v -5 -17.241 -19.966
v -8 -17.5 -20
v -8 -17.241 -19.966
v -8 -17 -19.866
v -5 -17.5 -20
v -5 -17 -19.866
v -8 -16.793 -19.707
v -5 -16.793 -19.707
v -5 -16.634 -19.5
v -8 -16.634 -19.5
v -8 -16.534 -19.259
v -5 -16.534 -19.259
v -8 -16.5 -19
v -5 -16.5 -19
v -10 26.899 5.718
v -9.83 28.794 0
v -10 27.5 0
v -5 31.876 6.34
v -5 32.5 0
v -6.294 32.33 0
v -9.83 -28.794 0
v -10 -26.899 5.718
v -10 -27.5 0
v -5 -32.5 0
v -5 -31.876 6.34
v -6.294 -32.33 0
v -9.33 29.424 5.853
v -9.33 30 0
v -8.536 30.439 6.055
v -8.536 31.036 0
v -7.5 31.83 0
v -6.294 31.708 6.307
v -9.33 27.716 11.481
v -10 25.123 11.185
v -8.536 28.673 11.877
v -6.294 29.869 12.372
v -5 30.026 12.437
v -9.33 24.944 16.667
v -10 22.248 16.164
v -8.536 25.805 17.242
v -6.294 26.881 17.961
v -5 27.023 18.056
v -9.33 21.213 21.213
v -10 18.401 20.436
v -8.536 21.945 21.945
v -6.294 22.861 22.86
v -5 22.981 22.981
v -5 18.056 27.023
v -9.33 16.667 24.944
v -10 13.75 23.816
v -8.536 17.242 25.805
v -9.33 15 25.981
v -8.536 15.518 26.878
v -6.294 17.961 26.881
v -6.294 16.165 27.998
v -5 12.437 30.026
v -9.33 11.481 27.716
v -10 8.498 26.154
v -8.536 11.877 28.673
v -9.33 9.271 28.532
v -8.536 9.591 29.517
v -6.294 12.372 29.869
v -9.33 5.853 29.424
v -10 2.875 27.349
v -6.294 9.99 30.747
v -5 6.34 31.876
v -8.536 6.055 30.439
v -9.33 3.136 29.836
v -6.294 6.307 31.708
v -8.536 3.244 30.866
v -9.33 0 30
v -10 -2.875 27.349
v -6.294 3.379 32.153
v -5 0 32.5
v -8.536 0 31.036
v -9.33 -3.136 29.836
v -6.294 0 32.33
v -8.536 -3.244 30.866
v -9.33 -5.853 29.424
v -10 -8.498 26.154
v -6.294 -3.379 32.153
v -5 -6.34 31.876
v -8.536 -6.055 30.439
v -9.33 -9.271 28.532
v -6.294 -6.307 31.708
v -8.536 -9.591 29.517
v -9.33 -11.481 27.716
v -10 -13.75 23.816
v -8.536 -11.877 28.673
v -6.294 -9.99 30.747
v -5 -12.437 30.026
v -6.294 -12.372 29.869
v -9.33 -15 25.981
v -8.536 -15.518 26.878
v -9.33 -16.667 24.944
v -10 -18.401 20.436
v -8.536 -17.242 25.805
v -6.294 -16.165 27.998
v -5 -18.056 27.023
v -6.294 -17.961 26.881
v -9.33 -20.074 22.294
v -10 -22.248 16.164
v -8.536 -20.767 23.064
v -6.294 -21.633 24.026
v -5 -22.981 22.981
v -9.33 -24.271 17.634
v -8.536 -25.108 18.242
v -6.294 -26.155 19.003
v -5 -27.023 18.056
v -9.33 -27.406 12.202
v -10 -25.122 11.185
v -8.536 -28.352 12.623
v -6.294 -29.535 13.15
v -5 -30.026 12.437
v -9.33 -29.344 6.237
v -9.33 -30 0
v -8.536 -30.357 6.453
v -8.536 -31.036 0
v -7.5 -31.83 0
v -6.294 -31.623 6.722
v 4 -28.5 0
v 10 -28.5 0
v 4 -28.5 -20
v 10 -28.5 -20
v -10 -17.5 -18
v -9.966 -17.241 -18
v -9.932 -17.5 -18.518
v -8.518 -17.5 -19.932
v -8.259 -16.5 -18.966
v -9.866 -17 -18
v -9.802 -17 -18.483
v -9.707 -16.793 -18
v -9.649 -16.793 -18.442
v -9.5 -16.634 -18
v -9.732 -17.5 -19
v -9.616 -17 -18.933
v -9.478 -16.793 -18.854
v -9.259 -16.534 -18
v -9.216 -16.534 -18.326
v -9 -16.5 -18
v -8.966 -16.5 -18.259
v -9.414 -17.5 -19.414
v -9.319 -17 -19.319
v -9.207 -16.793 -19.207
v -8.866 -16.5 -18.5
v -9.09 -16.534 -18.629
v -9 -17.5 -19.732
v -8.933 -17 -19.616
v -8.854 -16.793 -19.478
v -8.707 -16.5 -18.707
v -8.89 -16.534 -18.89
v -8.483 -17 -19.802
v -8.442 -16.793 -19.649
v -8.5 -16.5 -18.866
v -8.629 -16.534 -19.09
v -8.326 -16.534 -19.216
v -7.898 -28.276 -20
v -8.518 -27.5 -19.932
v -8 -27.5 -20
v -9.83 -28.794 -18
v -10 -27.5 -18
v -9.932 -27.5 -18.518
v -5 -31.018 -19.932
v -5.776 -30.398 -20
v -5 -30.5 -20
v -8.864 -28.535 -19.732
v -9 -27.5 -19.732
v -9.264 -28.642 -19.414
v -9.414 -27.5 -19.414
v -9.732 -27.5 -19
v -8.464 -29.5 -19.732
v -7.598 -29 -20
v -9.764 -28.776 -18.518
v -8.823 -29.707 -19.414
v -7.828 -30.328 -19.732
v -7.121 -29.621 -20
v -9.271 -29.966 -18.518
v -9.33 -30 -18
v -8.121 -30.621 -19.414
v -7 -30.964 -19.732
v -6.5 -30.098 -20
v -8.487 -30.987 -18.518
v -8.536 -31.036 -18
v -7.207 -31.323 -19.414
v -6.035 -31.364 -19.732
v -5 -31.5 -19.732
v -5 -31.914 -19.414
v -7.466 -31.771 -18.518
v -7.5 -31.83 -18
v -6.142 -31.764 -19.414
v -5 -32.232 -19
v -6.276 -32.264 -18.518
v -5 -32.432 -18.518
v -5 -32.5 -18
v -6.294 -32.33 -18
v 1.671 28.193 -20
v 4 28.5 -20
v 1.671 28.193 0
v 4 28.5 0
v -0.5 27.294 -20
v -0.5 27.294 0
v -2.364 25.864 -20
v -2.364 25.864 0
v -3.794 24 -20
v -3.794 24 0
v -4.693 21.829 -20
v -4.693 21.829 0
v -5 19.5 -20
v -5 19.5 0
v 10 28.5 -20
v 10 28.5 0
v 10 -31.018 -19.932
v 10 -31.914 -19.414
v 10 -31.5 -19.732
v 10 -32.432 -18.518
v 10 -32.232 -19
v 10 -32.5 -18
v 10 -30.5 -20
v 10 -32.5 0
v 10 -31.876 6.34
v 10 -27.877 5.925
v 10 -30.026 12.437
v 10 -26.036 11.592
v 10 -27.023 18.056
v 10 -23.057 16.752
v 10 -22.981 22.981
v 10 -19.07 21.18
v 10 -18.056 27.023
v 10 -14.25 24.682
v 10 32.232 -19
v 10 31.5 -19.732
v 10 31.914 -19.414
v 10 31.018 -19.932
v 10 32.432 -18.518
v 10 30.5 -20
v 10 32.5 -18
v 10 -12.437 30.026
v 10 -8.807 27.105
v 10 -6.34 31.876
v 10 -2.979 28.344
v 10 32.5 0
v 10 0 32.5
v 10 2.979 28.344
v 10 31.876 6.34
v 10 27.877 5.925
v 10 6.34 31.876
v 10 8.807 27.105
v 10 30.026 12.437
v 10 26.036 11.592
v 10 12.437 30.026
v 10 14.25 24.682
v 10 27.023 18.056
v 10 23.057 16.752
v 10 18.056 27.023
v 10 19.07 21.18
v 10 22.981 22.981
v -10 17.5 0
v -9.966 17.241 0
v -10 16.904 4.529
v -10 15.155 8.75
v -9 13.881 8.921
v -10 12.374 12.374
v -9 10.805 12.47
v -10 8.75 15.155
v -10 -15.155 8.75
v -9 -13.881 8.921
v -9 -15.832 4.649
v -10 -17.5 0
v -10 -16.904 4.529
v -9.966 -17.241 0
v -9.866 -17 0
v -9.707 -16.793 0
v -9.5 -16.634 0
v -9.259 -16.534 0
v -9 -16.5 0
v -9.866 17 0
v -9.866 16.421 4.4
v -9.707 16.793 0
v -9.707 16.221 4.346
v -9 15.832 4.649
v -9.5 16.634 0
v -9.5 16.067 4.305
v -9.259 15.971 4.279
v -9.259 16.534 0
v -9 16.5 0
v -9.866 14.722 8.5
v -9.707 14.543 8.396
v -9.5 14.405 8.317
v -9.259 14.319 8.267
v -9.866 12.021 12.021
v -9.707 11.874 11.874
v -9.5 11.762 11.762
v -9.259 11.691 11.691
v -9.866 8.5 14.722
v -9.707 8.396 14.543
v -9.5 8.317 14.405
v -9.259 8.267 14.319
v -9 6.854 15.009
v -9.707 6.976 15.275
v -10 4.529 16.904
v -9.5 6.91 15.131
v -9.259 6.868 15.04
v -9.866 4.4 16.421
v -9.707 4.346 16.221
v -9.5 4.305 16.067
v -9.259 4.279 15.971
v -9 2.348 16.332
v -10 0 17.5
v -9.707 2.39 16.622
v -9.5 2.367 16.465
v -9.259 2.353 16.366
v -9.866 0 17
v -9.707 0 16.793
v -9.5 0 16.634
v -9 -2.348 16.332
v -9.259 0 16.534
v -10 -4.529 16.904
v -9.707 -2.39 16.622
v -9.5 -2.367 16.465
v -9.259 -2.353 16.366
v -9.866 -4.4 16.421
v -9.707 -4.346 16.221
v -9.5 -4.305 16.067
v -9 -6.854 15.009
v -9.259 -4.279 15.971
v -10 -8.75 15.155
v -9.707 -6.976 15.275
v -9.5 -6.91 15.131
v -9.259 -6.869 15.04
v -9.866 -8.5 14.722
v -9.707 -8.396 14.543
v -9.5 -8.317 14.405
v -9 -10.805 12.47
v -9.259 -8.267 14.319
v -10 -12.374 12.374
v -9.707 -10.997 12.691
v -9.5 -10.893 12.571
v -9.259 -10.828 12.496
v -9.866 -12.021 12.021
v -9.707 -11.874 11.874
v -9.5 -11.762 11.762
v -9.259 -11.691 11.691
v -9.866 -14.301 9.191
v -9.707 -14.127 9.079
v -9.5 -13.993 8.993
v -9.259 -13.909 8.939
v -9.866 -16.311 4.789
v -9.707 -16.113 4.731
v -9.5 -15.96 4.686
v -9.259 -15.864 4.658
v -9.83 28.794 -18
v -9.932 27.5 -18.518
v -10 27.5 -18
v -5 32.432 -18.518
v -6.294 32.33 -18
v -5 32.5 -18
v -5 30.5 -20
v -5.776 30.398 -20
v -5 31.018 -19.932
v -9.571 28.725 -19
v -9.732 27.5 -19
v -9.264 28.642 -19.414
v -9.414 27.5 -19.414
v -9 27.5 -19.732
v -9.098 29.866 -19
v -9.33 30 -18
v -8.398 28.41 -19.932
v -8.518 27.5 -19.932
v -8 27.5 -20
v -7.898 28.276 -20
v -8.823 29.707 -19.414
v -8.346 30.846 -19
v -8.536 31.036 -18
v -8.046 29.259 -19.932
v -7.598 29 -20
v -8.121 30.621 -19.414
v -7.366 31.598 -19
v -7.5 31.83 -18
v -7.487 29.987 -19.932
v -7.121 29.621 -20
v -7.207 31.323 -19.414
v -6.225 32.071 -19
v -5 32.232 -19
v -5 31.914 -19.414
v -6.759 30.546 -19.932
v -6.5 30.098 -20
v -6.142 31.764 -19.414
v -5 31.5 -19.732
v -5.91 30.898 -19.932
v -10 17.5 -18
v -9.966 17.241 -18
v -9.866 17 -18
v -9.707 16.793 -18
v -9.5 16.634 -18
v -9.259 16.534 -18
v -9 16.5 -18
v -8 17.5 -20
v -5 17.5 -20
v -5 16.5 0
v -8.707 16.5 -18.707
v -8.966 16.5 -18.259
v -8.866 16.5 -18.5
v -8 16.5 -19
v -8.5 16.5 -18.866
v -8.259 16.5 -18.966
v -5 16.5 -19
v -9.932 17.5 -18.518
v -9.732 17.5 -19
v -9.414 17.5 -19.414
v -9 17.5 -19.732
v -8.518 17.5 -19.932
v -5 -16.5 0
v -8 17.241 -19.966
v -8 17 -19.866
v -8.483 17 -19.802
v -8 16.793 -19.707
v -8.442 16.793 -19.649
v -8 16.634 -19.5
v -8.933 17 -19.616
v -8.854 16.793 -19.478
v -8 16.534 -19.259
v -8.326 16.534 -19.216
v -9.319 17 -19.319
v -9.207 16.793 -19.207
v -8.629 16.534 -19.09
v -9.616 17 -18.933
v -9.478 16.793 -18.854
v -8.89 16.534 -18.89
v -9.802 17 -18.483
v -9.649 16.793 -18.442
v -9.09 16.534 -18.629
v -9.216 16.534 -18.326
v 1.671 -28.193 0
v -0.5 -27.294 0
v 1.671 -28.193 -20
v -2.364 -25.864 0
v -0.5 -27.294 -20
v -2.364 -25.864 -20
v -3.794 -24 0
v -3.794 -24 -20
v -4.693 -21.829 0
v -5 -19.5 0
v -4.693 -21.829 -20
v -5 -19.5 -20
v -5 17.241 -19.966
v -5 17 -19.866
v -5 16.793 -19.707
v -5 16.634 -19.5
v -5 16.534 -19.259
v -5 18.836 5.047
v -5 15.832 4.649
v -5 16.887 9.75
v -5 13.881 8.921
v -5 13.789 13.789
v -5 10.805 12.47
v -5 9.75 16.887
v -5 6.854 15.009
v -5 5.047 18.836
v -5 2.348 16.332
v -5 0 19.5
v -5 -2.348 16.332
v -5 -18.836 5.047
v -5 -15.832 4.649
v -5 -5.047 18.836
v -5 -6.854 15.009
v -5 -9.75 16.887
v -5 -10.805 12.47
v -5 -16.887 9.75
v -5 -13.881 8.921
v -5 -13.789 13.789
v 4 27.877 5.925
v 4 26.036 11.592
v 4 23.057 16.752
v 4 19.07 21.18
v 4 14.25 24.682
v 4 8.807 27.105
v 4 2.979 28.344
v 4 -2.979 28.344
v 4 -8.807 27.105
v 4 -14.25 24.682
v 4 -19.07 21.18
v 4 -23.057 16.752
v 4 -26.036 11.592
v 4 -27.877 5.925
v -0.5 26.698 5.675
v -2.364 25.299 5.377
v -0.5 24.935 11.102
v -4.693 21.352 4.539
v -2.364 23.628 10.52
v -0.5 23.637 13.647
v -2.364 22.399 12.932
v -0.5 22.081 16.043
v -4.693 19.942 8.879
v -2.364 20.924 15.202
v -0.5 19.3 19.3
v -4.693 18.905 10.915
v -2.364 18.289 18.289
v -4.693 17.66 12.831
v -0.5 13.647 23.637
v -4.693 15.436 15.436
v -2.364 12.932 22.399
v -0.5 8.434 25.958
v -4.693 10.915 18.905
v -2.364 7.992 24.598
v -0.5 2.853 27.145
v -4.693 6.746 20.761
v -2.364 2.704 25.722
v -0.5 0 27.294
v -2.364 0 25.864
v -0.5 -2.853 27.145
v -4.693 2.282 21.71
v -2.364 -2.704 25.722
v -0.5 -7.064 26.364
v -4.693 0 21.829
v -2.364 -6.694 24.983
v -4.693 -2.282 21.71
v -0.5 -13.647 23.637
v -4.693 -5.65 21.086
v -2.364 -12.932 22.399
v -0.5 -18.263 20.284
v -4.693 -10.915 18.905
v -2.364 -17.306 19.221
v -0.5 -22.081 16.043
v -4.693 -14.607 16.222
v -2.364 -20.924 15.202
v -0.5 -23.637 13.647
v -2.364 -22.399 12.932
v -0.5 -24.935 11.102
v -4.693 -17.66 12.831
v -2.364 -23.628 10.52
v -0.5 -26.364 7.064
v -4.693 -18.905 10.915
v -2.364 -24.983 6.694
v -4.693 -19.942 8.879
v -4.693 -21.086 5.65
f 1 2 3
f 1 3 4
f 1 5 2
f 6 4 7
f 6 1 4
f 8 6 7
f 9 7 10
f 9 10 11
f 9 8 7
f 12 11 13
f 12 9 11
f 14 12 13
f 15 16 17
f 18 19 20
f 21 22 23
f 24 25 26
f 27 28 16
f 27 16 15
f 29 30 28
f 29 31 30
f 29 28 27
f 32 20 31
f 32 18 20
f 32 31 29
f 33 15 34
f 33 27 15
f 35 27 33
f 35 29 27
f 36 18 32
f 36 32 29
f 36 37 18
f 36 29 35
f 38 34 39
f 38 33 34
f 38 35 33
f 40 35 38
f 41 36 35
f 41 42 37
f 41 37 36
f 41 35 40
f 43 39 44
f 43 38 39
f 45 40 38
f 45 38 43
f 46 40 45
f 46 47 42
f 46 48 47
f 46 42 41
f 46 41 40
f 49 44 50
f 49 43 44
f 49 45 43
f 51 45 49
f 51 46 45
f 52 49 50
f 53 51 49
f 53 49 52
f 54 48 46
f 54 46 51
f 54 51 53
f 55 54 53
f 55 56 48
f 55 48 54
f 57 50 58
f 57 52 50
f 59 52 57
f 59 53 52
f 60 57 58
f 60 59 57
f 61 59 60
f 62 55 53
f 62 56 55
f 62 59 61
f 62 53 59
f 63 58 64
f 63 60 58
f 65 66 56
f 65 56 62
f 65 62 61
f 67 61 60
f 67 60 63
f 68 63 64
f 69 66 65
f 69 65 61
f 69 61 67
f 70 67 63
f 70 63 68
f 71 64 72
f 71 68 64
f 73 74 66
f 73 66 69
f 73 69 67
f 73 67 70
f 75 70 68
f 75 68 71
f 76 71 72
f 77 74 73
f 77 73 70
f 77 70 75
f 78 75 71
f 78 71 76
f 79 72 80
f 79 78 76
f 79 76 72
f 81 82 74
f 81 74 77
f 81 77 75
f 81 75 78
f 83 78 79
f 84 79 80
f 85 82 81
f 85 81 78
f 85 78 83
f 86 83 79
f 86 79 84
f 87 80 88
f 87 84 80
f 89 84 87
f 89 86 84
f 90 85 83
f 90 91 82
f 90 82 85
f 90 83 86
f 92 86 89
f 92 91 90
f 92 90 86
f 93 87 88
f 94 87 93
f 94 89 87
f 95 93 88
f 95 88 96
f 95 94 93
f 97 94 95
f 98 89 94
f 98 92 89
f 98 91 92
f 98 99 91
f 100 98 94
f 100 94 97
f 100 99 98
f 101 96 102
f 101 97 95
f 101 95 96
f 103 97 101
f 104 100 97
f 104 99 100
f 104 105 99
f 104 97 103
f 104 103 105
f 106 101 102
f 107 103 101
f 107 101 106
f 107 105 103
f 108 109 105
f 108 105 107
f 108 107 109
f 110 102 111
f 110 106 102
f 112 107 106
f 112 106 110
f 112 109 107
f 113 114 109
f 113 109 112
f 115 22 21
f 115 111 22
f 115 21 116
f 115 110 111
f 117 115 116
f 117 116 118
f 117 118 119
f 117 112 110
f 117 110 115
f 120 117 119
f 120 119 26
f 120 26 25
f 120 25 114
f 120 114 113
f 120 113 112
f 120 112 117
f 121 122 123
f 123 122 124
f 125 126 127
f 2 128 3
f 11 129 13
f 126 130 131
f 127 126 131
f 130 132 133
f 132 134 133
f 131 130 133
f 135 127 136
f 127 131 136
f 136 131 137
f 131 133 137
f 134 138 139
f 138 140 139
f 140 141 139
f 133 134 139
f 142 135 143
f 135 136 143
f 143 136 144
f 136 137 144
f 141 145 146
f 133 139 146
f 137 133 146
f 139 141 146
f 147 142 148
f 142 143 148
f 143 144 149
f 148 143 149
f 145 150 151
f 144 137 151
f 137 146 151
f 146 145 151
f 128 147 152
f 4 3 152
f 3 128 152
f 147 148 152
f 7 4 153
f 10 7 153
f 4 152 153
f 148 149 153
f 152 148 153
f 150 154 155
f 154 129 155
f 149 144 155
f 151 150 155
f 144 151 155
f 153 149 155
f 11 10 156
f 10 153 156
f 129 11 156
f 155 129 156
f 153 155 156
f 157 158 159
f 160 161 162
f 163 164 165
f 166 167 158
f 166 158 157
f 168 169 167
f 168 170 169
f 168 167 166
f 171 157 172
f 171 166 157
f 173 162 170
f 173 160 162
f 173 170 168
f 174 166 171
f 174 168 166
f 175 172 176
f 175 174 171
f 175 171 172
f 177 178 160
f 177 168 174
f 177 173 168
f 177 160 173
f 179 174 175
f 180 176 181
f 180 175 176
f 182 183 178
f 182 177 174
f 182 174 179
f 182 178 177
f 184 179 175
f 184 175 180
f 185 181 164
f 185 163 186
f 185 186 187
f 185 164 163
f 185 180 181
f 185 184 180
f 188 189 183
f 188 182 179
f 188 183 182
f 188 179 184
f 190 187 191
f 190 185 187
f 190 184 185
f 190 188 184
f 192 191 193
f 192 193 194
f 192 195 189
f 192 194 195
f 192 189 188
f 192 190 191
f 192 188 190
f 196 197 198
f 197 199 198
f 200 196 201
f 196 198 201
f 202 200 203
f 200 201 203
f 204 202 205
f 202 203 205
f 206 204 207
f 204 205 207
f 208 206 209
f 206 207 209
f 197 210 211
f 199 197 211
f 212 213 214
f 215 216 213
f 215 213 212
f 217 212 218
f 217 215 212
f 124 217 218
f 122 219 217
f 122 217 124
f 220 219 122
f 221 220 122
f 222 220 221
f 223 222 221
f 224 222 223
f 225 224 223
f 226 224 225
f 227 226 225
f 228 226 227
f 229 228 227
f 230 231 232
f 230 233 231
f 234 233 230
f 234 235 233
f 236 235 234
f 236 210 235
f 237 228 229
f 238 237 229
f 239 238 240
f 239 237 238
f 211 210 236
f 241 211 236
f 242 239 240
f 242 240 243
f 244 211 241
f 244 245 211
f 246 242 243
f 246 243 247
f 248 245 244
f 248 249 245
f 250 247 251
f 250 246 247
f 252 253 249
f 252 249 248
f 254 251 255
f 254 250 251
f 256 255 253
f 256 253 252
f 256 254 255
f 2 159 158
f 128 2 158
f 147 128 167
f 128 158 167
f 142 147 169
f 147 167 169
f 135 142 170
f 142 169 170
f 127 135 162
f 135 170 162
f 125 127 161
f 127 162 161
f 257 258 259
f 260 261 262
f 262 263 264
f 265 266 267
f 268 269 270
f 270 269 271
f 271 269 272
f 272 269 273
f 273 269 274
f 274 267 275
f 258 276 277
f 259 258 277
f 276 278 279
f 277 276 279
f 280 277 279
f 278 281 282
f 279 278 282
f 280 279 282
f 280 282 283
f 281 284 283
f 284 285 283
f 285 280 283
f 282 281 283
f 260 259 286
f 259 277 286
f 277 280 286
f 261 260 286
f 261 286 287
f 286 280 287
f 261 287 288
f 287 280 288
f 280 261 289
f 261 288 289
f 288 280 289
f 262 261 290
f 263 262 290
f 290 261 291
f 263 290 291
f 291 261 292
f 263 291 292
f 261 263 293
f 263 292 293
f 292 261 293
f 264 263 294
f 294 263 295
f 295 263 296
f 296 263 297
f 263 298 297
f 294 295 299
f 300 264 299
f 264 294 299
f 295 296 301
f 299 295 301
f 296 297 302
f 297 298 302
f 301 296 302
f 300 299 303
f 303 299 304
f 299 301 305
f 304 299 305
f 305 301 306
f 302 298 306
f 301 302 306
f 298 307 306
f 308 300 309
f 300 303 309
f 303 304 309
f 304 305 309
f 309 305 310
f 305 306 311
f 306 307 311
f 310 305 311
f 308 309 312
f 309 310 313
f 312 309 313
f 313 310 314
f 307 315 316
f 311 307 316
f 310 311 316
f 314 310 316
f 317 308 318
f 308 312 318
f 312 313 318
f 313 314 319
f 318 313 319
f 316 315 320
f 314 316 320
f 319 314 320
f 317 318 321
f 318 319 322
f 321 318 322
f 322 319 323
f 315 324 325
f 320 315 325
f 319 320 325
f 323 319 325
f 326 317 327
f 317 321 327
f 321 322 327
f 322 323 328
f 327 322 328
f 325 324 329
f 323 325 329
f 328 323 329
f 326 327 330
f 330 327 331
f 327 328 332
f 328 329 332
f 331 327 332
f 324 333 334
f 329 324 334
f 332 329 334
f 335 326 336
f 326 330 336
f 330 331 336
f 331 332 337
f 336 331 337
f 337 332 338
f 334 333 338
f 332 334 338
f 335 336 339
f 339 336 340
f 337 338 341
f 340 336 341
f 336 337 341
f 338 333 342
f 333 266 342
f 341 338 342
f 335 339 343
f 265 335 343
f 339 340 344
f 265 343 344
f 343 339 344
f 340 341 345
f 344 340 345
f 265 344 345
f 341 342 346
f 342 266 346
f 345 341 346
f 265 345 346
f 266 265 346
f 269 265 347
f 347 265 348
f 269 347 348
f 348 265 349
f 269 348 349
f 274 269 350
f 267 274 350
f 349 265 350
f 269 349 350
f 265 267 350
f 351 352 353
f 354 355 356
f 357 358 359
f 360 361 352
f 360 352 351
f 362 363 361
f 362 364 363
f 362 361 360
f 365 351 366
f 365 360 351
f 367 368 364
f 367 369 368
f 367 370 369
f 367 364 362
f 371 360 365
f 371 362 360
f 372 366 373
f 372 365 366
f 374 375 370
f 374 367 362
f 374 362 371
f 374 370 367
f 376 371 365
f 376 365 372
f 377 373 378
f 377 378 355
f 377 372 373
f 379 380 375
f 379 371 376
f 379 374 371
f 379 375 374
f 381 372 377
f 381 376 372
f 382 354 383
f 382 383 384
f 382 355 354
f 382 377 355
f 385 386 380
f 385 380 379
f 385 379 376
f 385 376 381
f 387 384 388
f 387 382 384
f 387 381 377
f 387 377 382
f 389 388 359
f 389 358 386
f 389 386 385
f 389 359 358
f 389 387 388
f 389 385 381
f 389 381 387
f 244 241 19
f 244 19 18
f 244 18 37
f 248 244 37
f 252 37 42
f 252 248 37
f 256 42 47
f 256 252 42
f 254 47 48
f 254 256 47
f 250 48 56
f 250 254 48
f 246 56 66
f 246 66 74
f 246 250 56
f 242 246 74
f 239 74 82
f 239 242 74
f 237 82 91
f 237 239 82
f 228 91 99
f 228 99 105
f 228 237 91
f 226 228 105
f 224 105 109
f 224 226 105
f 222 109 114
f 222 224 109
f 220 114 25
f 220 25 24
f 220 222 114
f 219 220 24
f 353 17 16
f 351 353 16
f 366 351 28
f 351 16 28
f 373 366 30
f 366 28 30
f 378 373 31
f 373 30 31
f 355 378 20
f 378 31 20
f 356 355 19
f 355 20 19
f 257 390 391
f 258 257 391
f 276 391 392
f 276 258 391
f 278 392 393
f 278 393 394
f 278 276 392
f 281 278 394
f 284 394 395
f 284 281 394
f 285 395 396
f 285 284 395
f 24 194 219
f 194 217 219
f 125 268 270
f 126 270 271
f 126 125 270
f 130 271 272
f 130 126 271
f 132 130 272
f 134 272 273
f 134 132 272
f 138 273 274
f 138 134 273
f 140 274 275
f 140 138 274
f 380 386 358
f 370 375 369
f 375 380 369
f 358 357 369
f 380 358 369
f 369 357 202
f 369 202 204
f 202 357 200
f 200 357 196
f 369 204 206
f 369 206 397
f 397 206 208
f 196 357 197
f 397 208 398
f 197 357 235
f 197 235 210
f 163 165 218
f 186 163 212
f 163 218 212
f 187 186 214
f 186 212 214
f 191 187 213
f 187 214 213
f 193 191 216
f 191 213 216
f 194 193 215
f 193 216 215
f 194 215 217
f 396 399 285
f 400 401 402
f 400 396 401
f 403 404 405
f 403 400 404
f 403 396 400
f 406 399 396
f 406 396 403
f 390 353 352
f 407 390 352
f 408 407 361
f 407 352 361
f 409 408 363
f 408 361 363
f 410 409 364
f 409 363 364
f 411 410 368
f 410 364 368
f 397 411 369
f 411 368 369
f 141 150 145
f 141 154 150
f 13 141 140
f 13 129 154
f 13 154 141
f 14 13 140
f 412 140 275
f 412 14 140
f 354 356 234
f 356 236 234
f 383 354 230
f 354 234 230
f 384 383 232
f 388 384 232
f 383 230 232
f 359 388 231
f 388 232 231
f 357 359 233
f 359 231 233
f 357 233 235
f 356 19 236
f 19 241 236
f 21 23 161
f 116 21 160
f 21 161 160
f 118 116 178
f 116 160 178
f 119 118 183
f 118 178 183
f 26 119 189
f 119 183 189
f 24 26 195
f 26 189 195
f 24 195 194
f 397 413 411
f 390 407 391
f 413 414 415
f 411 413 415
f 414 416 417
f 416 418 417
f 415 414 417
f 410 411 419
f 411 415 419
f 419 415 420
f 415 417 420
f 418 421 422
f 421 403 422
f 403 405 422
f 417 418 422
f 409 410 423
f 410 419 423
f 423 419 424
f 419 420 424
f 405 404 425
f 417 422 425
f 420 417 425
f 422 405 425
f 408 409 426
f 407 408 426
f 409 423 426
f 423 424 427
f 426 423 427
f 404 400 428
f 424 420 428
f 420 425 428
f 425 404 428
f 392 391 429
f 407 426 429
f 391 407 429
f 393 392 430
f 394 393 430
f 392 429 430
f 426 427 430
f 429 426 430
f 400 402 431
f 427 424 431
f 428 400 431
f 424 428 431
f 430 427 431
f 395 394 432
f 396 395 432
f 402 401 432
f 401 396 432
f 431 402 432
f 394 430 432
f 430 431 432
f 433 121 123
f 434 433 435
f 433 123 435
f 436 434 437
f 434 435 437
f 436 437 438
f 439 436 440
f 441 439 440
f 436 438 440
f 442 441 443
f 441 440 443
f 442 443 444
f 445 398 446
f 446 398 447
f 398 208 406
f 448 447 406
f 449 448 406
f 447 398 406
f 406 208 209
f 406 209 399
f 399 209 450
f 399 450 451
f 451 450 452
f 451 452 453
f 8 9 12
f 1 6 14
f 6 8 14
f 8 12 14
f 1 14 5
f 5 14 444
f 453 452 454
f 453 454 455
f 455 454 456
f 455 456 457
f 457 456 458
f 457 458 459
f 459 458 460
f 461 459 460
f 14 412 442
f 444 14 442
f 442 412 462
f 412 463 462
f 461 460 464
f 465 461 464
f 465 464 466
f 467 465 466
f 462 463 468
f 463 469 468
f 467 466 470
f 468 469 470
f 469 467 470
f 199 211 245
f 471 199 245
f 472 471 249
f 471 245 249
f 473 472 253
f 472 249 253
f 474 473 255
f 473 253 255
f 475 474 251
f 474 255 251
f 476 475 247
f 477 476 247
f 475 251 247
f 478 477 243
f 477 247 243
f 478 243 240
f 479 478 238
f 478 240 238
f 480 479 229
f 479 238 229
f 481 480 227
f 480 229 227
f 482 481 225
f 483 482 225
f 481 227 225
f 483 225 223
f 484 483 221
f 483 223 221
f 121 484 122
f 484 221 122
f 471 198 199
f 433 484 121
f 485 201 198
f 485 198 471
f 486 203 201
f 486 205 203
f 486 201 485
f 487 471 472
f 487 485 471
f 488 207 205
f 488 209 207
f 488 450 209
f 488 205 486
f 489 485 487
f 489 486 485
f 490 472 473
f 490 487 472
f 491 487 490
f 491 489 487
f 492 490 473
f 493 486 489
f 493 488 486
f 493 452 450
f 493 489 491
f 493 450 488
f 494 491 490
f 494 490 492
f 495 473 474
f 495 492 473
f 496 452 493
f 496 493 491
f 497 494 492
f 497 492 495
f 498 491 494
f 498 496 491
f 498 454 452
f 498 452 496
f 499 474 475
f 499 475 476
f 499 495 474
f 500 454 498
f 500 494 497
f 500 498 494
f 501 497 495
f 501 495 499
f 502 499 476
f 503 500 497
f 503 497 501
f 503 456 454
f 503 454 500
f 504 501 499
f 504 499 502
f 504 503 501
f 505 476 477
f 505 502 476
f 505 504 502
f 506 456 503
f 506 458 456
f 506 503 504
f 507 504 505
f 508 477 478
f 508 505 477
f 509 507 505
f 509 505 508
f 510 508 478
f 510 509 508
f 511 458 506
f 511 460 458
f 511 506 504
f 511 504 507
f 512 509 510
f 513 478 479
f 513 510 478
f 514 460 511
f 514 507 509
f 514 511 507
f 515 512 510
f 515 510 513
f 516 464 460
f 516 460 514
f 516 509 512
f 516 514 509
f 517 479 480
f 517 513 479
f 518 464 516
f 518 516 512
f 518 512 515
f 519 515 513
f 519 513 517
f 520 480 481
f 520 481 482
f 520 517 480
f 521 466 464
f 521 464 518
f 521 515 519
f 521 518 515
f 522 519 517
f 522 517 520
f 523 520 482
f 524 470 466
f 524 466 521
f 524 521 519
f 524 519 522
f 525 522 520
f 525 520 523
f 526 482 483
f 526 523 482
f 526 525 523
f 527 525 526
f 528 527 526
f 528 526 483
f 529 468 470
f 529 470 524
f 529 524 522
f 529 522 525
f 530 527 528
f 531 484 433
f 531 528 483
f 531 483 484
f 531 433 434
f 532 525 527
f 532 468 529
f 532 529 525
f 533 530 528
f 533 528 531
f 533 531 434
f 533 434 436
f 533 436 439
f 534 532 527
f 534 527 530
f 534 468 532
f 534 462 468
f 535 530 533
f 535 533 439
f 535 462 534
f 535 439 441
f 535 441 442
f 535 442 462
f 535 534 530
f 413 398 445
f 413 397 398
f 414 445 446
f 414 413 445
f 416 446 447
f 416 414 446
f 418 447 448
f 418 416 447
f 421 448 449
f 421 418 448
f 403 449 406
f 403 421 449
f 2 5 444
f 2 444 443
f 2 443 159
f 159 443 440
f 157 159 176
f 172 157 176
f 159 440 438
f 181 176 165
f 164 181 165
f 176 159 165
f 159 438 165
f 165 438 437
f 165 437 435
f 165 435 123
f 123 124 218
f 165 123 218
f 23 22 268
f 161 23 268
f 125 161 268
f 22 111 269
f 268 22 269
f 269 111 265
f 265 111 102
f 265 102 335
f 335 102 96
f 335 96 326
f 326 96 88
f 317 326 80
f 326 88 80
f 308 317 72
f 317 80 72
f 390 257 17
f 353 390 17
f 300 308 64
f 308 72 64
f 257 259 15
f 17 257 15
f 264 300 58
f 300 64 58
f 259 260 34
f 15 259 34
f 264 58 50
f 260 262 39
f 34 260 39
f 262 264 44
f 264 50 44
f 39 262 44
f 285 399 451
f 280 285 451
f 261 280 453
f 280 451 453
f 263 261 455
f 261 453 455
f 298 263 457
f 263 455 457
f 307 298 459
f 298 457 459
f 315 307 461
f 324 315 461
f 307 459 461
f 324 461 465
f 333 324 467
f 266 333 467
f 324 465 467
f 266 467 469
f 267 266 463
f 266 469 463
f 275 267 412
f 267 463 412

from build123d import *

# Parameters (mm, degrees)
PAD_DEPTH    = 10
POCKET_DEPTH = 15
FILLET_R     = 9
FILLET001_R  = 5
FILLET002_R  = 2
FILLET003_R  = 1


with BuildPart() as part:
    # Sketch → Pad (new body, symmetric)
    with BuildSketch(Plane.YZ):
        with BuildLine():
            ThreePointArc((32.5, -1e-06), (1e-06, 32.5), (-32.5, 1e-06))
            Line((-32.5, -20), (-32.5, 1e-06))
            Line((-16.5, -20), (-32.5, -20))
            Line((-16.5, -20), (-16.5, 0))
            ThreePointArc((16.5, 5e-06), (-3e-06, 16.5), (-16.5, 0))
            Line((16.5, 5e-06), (16.5, -20))
            Line((32.5, -20), (16.5, -20))
            Line((32.5, -1e-06), (32.5, -20))
        make_face()
    extrude(amount=PAD_DEPTH, both=True)

    # Sketch001 → Pocket (cut)
    with BuildSketch(Plane.YZ.offset(10)):
        with BuildLine():
            Line((16.5, -20), (16.5, 5e-06))
            ThreePointArc((16.5, 5e-06), (-3e-06, 16.5), (-16.5, 0))
            Line((-16.5, 0), (-16.5, -20))
            Line((-28.5, -20), (-16.5, -20))
            Line((-28.5, 0), (-28.5, -20))
            ThreePointArc((28.5, 0), (0, 28.5), (-28.5, 0))
            Line((28.5, -20), (28.5, 0))
            Line((16.5, -20), (28.5, -20))
        make_face()
    extrude(amount=-POCKET_DEPTH, mode=Mode.SUBTRACT)

    # Fillet
    fillet_edges = [part.edges().sort_by_distance(p)[0] for p in [
        (-5, 0, 28.5),
    ]]
    fillet(fillet_edges, radius=FILLET_R)

    # Fillet001
    fillet001_edges = [part.edges().sort_by_distance(p)[0] for p in [
        (-10, 1e-06, 32.5),
    ]]
    fillet(fillet001_edges, radius=FILLET001_R)

    # Fillet002
    fillet002_edges = [part.edges().sort_by_distance(p)[0] for p in [
        (-8.535534, 31.035534, -20),
        (-8.535534, -31.035534, -20),
    ]]
    fillet(fillet002_edges, radius=FILLET002_R)

    # Fillet003
    fillet003_edges = [part.edges().sort_by_distance(p)[0] for p in [
        (-10, -3e-06, 16.5),
    ]]
    fillet(fillet003_edges, radius=FILLET003_R)


solid = part.part
